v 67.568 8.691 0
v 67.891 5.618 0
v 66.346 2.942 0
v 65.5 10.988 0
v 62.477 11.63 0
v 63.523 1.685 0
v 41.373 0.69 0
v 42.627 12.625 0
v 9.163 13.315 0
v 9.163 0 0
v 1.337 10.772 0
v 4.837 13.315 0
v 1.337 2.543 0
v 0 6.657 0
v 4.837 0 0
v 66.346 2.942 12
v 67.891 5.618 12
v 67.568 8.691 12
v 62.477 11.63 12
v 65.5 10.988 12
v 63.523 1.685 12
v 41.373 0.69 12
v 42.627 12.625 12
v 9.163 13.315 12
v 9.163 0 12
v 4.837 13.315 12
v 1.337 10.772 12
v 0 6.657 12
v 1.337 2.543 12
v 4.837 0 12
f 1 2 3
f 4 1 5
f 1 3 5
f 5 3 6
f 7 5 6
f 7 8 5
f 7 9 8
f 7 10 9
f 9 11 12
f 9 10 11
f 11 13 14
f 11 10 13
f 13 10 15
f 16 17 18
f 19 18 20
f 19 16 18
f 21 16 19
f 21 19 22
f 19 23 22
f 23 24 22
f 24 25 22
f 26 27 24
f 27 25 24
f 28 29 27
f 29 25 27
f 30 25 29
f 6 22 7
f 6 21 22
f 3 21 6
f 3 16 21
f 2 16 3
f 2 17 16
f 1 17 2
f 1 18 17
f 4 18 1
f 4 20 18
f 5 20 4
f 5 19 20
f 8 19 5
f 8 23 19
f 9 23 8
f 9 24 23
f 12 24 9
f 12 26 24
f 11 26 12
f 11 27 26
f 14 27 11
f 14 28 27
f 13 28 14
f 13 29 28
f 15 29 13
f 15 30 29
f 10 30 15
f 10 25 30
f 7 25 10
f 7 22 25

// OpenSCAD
$fn = 32;

// ----------------------------------------------------------------------
// Lever arm: two bosses 14 and 12 mm, 35 mm between centres
// ----------------------------------------------------------------------

// --- parameters (mm) ---
profile_height = 12;      // extrusion height
profile_points = 15;      // points of the closed outline

profile = [[0, 6.657], [1.337, 2.543], [4.837, 0], [9.163, 0], [41.373, 0.69], [63.523, 1.685], [66.346, 2.942], [67.891, 5.618], [67.568, 8.691], [65.5, 10.988], [62.477, 11.63], [42.627, 12.625], [9.163, 13.315], [4.837, 13.315], [1.337, 10.772]];  // single closed polygon, 15 points, counter clockwise

// --- the one profile operation ---
linear_extrude(height = profile_height) polygon(points = profile);
